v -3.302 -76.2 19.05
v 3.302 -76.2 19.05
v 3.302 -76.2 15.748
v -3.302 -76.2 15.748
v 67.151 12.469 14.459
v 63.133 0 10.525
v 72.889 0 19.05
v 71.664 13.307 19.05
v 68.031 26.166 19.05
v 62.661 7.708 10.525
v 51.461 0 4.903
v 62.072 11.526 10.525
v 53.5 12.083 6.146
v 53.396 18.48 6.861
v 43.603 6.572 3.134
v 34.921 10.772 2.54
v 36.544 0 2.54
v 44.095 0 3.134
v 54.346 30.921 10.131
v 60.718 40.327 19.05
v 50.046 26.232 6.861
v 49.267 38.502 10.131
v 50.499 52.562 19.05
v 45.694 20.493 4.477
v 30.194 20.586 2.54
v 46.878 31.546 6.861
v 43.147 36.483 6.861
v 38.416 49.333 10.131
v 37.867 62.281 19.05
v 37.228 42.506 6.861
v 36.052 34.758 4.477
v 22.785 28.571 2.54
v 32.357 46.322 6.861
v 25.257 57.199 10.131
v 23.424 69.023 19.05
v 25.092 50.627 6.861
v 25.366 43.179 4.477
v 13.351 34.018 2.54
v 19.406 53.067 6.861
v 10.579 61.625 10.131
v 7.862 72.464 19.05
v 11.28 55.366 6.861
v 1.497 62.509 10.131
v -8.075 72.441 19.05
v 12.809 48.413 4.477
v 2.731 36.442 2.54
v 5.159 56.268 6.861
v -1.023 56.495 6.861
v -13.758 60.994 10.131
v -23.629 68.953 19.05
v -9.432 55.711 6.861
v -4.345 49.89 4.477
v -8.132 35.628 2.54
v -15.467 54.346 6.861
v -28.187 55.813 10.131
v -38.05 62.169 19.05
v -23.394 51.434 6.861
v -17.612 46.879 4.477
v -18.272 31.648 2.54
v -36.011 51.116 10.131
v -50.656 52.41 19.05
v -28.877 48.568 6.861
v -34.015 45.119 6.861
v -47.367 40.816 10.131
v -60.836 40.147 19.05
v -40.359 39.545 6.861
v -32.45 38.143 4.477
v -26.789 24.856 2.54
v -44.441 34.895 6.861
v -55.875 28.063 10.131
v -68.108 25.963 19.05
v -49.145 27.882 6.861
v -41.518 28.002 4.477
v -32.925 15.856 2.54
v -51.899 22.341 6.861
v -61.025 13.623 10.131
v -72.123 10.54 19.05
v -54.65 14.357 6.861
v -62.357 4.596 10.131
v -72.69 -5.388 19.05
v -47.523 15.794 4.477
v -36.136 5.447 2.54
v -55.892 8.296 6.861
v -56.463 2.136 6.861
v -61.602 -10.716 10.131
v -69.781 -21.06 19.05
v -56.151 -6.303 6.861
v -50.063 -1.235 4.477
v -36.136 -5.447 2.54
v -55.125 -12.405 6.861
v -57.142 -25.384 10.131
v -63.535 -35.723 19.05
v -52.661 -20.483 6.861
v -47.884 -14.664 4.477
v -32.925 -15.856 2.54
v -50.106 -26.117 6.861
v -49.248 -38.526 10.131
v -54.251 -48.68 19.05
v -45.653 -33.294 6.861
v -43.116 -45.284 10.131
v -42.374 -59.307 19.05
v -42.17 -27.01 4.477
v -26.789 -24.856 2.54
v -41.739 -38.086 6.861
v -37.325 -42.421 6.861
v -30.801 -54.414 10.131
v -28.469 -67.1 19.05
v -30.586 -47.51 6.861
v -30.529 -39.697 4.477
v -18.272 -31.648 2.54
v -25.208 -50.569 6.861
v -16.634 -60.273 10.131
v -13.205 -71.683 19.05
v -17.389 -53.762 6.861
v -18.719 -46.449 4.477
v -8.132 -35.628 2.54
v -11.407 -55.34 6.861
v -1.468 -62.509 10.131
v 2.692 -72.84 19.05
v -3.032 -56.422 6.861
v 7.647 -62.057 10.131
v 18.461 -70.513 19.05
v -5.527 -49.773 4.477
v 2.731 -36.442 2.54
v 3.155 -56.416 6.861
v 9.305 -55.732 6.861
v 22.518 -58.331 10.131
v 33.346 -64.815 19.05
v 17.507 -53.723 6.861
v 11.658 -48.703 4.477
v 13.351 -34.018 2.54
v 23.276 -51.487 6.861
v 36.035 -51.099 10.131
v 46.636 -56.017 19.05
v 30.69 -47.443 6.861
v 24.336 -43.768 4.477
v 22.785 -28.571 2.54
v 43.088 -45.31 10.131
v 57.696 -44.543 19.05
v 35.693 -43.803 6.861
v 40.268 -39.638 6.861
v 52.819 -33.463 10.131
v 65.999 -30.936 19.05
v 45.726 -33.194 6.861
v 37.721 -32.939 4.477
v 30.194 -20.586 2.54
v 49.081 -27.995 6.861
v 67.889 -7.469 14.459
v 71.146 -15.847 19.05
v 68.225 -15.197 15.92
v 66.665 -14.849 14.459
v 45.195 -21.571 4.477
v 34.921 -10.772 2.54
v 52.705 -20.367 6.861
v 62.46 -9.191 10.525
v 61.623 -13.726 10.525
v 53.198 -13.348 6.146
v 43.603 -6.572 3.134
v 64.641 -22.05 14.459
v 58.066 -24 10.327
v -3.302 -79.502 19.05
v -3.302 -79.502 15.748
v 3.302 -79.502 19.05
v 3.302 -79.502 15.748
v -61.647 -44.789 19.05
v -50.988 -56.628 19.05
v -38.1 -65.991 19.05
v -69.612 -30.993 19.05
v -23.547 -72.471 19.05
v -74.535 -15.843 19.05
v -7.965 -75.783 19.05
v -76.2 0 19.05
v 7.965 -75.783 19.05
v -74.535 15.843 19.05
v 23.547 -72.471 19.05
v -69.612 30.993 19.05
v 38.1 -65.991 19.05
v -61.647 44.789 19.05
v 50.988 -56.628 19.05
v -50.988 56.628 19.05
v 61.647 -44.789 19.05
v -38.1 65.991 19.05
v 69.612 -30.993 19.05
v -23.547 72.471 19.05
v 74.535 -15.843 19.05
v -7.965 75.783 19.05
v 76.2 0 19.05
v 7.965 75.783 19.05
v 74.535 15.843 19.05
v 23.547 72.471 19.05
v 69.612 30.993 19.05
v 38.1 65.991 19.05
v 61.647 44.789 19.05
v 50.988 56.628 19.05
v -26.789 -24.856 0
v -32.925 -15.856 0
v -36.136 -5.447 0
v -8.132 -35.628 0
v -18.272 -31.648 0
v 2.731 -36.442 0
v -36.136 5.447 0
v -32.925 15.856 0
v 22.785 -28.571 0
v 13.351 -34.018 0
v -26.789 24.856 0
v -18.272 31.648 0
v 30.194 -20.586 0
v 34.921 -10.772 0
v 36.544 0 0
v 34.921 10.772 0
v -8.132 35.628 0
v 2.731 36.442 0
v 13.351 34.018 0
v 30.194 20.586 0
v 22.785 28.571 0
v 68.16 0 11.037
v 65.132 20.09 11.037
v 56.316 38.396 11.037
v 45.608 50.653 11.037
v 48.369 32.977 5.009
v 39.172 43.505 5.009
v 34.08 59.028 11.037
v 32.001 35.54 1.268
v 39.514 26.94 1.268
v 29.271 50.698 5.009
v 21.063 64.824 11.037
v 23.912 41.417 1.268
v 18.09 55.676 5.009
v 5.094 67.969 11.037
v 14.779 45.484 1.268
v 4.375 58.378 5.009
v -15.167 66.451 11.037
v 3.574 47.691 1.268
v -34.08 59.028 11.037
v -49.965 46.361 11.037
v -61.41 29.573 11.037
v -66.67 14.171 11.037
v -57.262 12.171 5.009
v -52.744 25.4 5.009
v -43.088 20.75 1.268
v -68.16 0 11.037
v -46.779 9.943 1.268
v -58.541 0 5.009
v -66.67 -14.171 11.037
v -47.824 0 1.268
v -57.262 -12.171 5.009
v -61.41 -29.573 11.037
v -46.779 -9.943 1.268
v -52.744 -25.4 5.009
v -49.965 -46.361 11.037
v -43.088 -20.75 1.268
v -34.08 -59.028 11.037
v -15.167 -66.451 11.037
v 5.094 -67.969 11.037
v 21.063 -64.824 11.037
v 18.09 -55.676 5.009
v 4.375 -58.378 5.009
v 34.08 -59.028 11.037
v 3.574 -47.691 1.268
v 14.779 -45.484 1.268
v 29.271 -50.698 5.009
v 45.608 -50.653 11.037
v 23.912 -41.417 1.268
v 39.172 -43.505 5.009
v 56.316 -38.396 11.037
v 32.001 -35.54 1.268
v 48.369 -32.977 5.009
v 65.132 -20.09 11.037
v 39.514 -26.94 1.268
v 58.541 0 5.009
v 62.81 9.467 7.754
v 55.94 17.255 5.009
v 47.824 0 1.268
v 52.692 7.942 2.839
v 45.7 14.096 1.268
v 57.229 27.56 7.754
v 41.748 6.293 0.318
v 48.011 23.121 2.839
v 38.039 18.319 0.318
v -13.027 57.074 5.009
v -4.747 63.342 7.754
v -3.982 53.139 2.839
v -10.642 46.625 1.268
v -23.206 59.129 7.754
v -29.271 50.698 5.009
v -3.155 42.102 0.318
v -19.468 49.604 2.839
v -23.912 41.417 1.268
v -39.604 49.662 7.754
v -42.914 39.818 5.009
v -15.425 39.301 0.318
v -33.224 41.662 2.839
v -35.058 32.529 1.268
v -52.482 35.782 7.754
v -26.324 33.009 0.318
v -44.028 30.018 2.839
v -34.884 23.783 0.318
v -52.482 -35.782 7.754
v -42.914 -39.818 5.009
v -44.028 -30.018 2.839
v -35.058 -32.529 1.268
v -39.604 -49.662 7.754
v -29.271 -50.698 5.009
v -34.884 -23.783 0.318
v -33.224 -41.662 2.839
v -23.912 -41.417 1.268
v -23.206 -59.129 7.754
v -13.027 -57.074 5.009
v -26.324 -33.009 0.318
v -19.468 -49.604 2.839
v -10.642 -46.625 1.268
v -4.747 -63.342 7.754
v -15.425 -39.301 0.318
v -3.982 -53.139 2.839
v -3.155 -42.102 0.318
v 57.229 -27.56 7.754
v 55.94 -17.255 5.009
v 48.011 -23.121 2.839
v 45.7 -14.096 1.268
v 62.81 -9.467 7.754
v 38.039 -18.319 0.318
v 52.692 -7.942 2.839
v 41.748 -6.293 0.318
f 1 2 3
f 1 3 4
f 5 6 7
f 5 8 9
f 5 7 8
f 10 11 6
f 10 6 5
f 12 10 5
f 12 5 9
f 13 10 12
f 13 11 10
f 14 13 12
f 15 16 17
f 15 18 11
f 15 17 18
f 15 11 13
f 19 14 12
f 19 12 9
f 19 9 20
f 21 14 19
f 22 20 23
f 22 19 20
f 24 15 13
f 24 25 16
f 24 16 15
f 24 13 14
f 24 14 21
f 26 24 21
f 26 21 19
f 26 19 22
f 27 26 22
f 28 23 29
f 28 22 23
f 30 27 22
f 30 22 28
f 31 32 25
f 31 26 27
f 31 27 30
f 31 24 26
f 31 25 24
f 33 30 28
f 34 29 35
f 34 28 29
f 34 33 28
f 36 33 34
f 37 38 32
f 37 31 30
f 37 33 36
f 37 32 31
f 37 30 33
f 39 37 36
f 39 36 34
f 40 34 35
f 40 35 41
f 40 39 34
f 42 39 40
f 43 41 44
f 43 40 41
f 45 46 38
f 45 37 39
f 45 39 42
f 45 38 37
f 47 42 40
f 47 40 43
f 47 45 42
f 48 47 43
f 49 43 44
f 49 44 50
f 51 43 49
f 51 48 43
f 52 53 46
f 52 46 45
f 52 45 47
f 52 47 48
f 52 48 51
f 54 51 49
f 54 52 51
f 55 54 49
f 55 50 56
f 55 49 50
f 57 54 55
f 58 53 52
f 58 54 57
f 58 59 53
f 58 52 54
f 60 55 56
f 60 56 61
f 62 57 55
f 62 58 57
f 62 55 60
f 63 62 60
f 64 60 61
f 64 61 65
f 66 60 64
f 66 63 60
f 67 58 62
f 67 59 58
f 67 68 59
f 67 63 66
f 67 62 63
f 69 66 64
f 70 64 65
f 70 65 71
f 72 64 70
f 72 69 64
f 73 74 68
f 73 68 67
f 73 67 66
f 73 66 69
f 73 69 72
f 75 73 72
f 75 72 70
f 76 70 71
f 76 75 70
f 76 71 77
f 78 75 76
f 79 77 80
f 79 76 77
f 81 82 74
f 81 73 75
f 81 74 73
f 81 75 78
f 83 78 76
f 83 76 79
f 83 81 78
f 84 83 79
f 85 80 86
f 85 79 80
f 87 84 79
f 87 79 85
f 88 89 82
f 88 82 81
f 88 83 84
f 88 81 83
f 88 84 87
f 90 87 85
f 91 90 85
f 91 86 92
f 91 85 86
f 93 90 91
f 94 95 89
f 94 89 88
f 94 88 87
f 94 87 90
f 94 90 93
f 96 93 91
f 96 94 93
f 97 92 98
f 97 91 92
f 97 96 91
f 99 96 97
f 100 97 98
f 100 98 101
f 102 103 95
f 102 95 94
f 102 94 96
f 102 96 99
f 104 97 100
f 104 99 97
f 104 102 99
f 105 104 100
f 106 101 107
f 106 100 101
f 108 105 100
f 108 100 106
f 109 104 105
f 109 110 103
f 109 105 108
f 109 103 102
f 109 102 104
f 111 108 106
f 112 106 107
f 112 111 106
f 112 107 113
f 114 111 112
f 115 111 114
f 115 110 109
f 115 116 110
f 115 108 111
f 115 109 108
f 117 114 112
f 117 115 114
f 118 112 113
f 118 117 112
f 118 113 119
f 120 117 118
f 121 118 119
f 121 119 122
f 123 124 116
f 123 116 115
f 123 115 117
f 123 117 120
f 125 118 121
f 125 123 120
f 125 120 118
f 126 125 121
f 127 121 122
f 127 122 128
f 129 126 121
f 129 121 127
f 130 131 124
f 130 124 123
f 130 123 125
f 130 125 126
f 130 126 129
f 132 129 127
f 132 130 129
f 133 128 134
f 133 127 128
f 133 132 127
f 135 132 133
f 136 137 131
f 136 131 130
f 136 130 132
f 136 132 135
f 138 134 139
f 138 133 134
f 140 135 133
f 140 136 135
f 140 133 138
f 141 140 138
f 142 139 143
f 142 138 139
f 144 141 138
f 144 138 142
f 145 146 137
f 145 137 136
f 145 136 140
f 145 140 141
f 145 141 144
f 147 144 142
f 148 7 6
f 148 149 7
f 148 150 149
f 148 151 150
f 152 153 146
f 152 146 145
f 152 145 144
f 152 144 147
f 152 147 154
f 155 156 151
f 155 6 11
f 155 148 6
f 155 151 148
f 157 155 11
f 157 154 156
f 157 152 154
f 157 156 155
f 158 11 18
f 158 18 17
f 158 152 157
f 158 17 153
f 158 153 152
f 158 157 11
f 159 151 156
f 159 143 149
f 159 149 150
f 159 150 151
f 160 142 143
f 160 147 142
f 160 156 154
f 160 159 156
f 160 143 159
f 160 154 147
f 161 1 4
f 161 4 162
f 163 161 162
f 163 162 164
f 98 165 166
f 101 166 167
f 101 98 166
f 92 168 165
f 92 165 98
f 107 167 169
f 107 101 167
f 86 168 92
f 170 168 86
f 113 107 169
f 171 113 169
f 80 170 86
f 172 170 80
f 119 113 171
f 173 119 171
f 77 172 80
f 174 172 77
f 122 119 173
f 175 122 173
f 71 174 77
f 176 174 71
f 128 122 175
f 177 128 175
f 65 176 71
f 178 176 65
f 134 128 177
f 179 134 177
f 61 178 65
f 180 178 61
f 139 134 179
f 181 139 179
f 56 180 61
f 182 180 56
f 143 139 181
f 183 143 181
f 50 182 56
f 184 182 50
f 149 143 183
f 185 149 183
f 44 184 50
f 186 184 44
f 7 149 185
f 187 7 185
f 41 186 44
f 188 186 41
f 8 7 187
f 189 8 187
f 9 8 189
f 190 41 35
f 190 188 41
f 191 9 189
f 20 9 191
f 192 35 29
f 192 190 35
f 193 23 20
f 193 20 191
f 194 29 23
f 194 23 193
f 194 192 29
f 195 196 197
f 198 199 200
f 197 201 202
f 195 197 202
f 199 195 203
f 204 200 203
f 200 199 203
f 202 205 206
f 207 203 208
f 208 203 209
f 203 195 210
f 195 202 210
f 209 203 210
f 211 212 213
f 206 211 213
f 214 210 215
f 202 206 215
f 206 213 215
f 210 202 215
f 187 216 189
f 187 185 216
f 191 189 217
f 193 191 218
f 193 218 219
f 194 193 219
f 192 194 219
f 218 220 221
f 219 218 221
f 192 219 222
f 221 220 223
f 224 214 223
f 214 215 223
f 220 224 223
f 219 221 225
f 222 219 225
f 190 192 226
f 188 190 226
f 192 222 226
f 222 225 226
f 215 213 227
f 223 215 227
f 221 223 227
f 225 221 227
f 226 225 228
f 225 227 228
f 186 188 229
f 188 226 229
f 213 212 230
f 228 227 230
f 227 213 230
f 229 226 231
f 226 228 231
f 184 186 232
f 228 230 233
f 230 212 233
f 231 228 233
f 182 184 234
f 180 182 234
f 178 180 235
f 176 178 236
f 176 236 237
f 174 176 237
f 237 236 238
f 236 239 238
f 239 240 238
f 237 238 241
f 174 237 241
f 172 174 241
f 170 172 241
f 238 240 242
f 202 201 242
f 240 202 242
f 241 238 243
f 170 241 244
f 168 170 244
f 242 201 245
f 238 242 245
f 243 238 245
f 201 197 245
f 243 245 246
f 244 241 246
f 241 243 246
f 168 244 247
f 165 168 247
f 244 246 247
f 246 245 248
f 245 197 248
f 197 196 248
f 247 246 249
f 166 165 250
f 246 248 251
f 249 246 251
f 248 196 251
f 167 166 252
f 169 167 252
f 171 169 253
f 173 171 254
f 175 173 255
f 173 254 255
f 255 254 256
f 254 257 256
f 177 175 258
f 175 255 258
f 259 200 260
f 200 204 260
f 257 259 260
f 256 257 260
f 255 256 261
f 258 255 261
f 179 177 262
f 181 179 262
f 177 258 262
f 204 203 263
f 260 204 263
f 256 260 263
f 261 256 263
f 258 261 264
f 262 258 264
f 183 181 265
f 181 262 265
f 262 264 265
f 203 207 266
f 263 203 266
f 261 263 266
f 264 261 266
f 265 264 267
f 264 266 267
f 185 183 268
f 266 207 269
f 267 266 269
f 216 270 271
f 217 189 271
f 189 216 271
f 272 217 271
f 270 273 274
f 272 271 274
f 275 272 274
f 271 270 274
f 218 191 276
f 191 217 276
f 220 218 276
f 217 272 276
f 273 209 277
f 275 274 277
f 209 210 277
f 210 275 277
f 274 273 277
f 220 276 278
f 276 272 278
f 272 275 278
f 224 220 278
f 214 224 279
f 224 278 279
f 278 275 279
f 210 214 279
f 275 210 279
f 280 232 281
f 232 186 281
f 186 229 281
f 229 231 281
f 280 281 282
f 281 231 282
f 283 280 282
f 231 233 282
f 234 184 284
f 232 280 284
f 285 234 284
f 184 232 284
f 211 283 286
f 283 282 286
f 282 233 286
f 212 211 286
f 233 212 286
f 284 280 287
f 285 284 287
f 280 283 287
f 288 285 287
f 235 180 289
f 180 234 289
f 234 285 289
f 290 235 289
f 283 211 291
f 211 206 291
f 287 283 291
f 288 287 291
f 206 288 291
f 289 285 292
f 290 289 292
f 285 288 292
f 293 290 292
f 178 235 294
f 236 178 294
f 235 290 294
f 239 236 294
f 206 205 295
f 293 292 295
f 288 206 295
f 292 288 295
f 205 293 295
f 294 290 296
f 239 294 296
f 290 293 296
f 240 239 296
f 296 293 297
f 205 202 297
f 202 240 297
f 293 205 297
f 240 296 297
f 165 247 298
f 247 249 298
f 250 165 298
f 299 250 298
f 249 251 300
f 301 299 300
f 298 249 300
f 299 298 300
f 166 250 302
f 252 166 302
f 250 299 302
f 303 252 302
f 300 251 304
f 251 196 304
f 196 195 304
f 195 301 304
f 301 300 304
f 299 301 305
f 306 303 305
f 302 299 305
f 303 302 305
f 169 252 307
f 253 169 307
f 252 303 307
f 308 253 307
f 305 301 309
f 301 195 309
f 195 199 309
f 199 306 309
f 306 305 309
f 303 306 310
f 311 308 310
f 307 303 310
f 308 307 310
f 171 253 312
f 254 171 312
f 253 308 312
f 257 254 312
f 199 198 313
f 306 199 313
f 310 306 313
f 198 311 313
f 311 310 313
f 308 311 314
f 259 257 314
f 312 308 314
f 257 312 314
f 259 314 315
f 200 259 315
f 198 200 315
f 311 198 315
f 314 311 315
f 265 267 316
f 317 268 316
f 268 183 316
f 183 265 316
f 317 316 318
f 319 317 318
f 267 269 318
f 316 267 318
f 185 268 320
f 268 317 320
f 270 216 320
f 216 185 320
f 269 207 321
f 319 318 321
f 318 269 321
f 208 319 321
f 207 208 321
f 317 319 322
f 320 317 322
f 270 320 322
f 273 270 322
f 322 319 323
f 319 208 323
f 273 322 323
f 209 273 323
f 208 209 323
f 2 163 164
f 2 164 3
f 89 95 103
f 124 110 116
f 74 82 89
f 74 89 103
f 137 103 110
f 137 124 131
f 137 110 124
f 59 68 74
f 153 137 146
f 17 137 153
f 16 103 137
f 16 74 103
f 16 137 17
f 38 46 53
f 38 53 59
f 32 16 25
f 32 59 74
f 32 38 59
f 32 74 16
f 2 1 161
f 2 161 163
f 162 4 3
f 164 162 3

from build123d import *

# Parameters (mm, degrees)
F0_R     = 76.2
F1_DEPTH = 19.05
F3_T     = -2.54
F5_DEPTH = 3.302


# Not quite as in the source:
# - a fillet or chamfer that OpenCascade refuses, or shapes differently, is made with other operations: its cross-section is extruded or revolved along the edge and cut away or added
# - a feature names something its author has since deleted; it is built from what else it names


with BuildPart() as f1:
    # F0 (on Top) → F1 (new body)
    with BuildSketch(Plane.XY):
        Circle(F0_R)
    extrude(amount=F1_DEPTH)

    # F2: fillet of radius 50.8 on 1 edges, made by hand

    # F2_s1 → F2_t2 (revolve, cut)
    with BuildSketch(Plane.XZ):
        with BuildLine():
            ThreePointArc((76.2, 19.05), (58.5413079663, 5.0094988016), (36.5442627102, 0))
            Line((36.5442627102, 0), (76.2, 0))
            Line((76.2, 0), (76.2, 19.05))
        make_face()
    revolve(axis=Axis((0, 0, 0), (0, 0, 1)), mode=Mode.SUBTRACT)

    # F3
    f3_openings = [f1.faces().sort_by_distance(p)[0] for p in [
        (0, 0, 19.05),
    ]]
    offset(amount=F3_T, openings=f3_openings)


with BuildPart() as f5:
    # F4 (on face) → F5 (new body)
    with BuildSketch(Plane.XY.offset(19.05)):
        Polygon((3.302, -76.2), (0, -76.2), (-3.302, -76.2), (-3.302, -79.502), (3.302, -79.502), align=None)
    extrude(amount=-F5_DEPTH)


solid = Compound([f1.part, f5.part])
